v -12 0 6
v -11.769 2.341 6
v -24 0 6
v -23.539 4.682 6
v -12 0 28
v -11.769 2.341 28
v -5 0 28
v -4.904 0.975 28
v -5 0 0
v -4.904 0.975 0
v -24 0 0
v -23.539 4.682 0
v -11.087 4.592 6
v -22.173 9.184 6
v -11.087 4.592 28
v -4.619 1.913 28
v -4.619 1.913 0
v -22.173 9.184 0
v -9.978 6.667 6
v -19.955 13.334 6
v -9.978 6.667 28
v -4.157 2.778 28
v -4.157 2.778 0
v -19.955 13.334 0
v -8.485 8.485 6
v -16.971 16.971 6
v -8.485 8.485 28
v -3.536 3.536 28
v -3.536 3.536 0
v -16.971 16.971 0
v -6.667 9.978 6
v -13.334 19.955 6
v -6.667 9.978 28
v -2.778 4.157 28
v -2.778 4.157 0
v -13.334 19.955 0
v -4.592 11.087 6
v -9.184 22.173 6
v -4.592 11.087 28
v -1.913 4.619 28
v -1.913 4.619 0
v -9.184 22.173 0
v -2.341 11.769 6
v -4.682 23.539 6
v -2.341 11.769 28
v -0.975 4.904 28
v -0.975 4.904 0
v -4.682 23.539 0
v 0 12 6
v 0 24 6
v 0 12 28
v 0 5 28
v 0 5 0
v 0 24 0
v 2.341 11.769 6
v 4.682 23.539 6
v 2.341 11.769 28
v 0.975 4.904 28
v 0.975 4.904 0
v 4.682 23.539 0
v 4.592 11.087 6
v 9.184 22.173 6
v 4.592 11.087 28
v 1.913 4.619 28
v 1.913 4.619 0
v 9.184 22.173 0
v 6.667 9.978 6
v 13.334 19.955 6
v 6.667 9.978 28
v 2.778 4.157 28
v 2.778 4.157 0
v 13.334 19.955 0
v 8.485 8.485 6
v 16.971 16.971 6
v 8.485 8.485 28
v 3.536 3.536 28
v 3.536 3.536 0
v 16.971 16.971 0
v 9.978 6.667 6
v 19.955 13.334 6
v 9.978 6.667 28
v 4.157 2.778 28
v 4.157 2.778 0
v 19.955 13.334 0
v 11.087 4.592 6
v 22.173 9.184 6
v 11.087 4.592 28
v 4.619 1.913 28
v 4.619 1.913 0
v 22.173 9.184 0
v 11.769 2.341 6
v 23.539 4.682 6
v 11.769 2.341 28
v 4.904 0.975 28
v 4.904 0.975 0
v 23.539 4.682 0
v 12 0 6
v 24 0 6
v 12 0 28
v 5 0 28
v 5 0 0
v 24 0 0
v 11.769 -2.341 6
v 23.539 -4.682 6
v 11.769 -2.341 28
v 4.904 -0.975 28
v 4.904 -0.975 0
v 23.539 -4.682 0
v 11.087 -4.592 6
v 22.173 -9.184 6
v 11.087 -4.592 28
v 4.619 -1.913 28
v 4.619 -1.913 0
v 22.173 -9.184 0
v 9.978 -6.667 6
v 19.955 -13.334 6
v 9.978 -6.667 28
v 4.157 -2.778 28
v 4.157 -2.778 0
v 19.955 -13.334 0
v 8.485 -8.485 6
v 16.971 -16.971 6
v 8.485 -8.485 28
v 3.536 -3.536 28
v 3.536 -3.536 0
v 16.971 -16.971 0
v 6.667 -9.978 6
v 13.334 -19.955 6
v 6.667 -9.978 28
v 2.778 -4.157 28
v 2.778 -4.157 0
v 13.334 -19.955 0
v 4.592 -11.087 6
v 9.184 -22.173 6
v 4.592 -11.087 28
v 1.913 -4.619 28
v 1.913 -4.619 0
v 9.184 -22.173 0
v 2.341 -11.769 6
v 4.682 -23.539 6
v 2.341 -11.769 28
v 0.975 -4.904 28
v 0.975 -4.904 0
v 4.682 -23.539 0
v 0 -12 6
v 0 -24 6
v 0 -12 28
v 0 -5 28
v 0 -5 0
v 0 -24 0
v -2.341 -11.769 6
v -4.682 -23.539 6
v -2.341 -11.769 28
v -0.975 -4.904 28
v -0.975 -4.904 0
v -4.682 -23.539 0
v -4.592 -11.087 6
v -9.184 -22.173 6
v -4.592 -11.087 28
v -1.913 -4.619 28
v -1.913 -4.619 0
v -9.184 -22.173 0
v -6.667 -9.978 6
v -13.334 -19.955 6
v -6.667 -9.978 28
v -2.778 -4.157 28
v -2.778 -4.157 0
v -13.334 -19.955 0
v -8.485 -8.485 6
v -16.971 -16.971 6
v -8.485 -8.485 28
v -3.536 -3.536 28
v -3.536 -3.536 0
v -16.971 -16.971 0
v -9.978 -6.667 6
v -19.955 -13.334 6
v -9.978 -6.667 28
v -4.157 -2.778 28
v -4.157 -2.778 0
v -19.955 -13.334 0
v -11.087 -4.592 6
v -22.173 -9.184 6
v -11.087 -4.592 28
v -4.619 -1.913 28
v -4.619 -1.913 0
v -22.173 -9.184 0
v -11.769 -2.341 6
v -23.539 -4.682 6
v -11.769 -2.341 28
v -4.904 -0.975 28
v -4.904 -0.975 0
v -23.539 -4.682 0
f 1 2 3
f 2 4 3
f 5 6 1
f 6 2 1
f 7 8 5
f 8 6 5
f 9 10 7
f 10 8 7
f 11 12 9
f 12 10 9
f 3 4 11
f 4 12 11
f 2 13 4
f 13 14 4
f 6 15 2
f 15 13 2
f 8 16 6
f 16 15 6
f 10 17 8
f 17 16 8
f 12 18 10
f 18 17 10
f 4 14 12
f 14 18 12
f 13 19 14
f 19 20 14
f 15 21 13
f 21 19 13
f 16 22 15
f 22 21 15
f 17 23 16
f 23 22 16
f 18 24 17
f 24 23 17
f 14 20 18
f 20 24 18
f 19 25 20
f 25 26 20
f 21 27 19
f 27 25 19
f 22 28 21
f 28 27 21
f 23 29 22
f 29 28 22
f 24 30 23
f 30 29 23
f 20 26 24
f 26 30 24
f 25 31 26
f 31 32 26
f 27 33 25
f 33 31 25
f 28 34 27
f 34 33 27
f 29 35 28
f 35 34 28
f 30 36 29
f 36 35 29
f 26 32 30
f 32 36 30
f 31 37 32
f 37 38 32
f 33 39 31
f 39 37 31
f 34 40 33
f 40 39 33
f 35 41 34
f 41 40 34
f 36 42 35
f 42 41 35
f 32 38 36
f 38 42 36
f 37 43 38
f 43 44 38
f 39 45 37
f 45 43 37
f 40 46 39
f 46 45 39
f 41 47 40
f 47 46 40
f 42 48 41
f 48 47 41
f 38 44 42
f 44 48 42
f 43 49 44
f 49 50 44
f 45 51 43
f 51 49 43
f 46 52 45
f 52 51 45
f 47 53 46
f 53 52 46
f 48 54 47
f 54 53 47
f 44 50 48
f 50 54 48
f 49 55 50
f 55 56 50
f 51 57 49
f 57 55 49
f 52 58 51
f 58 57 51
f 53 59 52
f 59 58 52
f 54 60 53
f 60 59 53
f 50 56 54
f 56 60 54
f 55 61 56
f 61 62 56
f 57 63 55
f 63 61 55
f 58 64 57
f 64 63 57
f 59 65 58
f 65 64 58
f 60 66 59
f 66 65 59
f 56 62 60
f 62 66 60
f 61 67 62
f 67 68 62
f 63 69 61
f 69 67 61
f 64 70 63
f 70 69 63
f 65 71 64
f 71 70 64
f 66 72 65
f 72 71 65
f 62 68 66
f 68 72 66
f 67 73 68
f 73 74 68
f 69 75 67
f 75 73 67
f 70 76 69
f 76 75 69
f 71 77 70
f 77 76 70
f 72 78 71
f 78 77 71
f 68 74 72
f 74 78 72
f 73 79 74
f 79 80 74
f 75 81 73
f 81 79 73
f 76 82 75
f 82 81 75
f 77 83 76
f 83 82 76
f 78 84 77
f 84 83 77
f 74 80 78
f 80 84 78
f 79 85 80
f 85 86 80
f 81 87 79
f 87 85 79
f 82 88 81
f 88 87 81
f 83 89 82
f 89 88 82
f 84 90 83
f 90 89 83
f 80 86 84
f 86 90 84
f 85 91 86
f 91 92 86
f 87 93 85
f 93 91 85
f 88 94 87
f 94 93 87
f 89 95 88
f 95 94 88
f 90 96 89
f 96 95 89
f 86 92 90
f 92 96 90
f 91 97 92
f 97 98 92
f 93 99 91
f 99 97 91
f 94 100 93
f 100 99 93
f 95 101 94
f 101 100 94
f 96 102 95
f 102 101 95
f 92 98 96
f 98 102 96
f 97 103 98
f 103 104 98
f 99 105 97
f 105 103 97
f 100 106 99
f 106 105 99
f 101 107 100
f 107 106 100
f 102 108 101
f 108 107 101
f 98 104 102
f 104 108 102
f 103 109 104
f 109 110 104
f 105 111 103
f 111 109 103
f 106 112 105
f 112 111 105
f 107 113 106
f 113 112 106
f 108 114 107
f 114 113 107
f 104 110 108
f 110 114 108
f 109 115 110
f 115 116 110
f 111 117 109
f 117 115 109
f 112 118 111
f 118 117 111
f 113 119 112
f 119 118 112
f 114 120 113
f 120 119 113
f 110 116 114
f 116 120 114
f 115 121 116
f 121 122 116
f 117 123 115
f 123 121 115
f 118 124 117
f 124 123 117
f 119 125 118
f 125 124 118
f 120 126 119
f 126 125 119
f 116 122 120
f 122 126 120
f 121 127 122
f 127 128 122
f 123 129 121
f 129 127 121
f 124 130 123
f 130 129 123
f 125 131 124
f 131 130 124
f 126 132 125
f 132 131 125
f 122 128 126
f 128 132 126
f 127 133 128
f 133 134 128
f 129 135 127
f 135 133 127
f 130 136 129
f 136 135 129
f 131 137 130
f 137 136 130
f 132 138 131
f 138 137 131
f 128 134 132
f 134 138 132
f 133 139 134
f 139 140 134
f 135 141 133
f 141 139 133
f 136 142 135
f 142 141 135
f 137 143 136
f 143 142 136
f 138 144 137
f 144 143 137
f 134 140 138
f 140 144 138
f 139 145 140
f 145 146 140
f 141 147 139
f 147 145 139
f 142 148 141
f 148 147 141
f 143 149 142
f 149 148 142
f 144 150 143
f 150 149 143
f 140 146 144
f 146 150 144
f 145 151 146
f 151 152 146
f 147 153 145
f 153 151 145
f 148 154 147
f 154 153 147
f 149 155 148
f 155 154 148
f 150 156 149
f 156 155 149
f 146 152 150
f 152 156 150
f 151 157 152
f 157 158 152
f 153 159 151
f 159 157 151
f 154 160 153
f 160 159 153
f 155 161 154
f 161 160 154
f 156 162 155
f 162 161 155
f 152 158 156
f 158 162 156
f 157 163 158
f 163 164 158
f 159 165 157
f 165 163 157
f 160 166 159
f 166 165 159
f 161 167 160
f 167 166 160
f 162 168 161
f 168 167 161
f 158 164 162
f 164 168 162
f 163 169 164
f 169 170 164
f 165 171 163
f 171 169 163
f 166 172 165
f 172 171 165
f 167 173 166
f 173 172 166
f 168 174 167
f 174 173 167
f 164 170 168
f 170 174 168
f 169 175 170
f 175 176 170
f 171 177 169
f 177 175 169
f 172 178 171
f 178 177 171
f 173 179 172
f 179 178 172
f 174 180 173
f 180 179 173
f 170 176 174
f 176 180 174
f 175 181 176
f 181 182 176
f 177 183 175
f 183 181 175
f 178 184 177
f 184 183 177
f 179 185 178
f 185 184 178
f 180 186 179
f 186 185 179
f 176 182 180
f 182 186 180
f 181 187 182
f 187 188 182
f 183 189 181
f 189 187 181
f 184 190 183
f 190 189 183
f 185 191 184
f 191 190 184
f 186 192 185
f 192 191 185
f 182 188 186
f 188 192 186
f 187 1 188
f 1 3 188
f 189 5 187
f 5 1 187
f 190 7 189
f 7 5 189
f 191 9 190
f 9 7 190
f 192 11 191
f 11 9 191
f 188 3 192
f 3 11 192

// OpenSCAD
$fn = 32;

// ----------------------------------------------------------------------
// Revolved part: flanged bushing R24
// ----------------------------------------------------------------------

// --- parameters (mm) ---
bore_r = 5;               // bore radius
flange_r = 24;            // flange radius
flange_h = 6;             // flange thickness
sleeve_r = 12;            // sleeve radius
total_h = 28;             // overall height
revolve_angle = 360;      // revolve sweep, degrees

bore_d = 2 * bore_r;
flange_d = 2 * flange_r;
sleeve_d = 2 * sleeve_r;

profile = [[5, 0], [24, 0], [24, 6], [12, 6], [12, 28], [5, 28]];  // primary outline, 6 points, counter clockwise

// --- the one profile operation ---
rotate_extrude(angle = revolve_angle) polygon(points = profile);
